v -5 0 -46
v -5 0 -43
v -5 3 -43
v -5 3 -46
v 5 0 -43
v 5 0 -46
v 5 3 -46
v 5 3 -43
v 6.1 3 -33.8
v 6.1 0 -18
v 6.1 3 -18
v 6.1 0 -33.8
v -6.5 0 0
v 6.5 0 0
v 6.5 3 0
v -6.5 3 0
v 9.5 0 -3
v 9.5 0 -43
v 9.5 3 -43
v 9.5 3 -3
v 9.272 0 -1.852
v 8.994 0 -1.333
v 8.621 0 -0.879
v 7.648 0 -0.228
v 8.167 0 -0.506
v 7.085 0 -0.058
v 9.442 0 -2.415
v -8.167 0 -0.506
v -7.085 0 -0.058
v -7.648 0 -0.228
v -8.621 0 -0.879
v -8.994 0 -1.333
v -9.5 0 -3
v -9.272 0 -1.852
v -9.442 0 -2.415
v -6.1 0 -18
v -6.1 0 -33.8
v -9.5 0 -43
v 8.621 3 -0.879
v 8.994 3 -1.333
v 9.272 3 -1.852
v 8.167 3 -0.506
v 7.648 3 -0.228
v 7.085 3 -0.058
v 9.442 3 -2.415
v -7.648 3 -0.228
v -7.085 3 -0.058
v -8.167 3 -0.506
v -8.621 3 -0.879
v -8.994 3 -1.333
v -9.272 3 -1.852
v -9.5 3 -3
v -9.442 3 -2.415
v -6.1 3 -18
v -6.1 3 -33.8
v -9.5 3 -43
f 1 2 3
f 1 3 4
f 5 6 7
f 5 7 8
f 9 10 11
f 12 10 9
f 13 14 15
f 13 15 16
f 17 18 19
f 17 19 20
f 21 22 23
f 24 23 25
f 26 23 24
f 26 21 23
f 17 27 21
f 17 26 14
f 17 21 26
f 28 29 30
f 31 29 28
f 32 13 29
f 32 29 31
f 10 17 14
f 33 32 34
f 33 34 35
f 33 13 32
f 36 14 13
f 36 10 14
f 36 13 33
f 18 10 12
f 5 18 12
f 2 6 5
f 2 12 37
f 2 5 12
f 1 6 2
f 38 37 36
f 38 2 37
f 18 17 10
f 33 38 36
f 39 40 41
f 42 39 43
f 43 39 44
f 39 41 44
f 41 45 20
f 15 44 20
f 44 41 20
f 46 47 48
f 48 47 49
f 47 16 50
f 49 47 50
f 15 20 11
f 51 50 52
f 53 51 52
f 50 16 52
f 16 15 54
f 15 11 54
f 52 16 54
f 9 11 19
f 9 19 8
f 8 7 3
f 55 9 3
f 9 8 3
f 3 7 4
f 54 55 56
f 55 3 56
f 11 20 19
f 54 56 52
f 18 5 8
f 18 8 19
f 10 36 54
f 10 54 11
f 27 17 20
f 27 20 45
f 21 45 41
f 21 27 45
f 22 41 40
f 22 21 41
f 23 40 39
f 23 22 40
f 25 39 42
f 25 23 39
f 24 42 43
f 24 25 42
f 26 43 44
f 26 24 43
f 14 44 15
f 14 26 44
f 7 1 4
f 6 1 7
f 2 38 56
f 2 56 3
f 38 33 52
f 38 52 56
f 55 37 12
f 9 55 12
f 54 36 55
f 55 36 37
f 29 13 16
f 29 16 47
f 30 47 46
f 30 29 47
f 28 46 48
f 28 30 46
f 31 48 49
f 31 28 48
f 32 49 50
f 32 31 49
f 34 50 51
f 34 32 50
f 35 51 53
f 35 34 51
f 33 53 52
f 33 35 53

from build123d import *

# Parameters (mm, degrees)
ESQUISSE1_W        = 12.2
ESQUISSE1_H        = 15.8
BOSS_EXTRU_1_DEPTH = 3


with BuildPart() as part:
    # Esquisse1 → Boss.-Extru.1 (new body)
    with BuildSketch(Plane(origin=(0, 0, 0), x_dir=(1, 0, 0), z_dir=(0, 1, 0))):
        with BuildLine():
            Line((-9.5, 43), (-5, 43))
            Line((-5, 43), (-5, 46))
            Line((-5, 46), (5, 46))
            Line((5, 46), (5, 43))
            Line((5, 43), (9.5, 43))
            Line((9.5, 43), (9.5, 3))
            ThreePointArc((9.5, 3), (8.621320344, 0.878679656), (6.5, 0))
            Line((6.5, 0), (-6.5, 0))
            ThreePointArc((-6.5, 0), (-8.621320344, 0.878679656), (-9.5, 3))
            Line((-9.5, 3), (-9.5, 43))
        make_face()
        with Locations((0, 25.9)):
            Rectangle(ESQUISSE1_W, ESQUISSE1_H, mode=Mode.SUBTRACT)
    extrude(amount=BOSS_EXTRU_1_DEPTH)


solid = part.part
